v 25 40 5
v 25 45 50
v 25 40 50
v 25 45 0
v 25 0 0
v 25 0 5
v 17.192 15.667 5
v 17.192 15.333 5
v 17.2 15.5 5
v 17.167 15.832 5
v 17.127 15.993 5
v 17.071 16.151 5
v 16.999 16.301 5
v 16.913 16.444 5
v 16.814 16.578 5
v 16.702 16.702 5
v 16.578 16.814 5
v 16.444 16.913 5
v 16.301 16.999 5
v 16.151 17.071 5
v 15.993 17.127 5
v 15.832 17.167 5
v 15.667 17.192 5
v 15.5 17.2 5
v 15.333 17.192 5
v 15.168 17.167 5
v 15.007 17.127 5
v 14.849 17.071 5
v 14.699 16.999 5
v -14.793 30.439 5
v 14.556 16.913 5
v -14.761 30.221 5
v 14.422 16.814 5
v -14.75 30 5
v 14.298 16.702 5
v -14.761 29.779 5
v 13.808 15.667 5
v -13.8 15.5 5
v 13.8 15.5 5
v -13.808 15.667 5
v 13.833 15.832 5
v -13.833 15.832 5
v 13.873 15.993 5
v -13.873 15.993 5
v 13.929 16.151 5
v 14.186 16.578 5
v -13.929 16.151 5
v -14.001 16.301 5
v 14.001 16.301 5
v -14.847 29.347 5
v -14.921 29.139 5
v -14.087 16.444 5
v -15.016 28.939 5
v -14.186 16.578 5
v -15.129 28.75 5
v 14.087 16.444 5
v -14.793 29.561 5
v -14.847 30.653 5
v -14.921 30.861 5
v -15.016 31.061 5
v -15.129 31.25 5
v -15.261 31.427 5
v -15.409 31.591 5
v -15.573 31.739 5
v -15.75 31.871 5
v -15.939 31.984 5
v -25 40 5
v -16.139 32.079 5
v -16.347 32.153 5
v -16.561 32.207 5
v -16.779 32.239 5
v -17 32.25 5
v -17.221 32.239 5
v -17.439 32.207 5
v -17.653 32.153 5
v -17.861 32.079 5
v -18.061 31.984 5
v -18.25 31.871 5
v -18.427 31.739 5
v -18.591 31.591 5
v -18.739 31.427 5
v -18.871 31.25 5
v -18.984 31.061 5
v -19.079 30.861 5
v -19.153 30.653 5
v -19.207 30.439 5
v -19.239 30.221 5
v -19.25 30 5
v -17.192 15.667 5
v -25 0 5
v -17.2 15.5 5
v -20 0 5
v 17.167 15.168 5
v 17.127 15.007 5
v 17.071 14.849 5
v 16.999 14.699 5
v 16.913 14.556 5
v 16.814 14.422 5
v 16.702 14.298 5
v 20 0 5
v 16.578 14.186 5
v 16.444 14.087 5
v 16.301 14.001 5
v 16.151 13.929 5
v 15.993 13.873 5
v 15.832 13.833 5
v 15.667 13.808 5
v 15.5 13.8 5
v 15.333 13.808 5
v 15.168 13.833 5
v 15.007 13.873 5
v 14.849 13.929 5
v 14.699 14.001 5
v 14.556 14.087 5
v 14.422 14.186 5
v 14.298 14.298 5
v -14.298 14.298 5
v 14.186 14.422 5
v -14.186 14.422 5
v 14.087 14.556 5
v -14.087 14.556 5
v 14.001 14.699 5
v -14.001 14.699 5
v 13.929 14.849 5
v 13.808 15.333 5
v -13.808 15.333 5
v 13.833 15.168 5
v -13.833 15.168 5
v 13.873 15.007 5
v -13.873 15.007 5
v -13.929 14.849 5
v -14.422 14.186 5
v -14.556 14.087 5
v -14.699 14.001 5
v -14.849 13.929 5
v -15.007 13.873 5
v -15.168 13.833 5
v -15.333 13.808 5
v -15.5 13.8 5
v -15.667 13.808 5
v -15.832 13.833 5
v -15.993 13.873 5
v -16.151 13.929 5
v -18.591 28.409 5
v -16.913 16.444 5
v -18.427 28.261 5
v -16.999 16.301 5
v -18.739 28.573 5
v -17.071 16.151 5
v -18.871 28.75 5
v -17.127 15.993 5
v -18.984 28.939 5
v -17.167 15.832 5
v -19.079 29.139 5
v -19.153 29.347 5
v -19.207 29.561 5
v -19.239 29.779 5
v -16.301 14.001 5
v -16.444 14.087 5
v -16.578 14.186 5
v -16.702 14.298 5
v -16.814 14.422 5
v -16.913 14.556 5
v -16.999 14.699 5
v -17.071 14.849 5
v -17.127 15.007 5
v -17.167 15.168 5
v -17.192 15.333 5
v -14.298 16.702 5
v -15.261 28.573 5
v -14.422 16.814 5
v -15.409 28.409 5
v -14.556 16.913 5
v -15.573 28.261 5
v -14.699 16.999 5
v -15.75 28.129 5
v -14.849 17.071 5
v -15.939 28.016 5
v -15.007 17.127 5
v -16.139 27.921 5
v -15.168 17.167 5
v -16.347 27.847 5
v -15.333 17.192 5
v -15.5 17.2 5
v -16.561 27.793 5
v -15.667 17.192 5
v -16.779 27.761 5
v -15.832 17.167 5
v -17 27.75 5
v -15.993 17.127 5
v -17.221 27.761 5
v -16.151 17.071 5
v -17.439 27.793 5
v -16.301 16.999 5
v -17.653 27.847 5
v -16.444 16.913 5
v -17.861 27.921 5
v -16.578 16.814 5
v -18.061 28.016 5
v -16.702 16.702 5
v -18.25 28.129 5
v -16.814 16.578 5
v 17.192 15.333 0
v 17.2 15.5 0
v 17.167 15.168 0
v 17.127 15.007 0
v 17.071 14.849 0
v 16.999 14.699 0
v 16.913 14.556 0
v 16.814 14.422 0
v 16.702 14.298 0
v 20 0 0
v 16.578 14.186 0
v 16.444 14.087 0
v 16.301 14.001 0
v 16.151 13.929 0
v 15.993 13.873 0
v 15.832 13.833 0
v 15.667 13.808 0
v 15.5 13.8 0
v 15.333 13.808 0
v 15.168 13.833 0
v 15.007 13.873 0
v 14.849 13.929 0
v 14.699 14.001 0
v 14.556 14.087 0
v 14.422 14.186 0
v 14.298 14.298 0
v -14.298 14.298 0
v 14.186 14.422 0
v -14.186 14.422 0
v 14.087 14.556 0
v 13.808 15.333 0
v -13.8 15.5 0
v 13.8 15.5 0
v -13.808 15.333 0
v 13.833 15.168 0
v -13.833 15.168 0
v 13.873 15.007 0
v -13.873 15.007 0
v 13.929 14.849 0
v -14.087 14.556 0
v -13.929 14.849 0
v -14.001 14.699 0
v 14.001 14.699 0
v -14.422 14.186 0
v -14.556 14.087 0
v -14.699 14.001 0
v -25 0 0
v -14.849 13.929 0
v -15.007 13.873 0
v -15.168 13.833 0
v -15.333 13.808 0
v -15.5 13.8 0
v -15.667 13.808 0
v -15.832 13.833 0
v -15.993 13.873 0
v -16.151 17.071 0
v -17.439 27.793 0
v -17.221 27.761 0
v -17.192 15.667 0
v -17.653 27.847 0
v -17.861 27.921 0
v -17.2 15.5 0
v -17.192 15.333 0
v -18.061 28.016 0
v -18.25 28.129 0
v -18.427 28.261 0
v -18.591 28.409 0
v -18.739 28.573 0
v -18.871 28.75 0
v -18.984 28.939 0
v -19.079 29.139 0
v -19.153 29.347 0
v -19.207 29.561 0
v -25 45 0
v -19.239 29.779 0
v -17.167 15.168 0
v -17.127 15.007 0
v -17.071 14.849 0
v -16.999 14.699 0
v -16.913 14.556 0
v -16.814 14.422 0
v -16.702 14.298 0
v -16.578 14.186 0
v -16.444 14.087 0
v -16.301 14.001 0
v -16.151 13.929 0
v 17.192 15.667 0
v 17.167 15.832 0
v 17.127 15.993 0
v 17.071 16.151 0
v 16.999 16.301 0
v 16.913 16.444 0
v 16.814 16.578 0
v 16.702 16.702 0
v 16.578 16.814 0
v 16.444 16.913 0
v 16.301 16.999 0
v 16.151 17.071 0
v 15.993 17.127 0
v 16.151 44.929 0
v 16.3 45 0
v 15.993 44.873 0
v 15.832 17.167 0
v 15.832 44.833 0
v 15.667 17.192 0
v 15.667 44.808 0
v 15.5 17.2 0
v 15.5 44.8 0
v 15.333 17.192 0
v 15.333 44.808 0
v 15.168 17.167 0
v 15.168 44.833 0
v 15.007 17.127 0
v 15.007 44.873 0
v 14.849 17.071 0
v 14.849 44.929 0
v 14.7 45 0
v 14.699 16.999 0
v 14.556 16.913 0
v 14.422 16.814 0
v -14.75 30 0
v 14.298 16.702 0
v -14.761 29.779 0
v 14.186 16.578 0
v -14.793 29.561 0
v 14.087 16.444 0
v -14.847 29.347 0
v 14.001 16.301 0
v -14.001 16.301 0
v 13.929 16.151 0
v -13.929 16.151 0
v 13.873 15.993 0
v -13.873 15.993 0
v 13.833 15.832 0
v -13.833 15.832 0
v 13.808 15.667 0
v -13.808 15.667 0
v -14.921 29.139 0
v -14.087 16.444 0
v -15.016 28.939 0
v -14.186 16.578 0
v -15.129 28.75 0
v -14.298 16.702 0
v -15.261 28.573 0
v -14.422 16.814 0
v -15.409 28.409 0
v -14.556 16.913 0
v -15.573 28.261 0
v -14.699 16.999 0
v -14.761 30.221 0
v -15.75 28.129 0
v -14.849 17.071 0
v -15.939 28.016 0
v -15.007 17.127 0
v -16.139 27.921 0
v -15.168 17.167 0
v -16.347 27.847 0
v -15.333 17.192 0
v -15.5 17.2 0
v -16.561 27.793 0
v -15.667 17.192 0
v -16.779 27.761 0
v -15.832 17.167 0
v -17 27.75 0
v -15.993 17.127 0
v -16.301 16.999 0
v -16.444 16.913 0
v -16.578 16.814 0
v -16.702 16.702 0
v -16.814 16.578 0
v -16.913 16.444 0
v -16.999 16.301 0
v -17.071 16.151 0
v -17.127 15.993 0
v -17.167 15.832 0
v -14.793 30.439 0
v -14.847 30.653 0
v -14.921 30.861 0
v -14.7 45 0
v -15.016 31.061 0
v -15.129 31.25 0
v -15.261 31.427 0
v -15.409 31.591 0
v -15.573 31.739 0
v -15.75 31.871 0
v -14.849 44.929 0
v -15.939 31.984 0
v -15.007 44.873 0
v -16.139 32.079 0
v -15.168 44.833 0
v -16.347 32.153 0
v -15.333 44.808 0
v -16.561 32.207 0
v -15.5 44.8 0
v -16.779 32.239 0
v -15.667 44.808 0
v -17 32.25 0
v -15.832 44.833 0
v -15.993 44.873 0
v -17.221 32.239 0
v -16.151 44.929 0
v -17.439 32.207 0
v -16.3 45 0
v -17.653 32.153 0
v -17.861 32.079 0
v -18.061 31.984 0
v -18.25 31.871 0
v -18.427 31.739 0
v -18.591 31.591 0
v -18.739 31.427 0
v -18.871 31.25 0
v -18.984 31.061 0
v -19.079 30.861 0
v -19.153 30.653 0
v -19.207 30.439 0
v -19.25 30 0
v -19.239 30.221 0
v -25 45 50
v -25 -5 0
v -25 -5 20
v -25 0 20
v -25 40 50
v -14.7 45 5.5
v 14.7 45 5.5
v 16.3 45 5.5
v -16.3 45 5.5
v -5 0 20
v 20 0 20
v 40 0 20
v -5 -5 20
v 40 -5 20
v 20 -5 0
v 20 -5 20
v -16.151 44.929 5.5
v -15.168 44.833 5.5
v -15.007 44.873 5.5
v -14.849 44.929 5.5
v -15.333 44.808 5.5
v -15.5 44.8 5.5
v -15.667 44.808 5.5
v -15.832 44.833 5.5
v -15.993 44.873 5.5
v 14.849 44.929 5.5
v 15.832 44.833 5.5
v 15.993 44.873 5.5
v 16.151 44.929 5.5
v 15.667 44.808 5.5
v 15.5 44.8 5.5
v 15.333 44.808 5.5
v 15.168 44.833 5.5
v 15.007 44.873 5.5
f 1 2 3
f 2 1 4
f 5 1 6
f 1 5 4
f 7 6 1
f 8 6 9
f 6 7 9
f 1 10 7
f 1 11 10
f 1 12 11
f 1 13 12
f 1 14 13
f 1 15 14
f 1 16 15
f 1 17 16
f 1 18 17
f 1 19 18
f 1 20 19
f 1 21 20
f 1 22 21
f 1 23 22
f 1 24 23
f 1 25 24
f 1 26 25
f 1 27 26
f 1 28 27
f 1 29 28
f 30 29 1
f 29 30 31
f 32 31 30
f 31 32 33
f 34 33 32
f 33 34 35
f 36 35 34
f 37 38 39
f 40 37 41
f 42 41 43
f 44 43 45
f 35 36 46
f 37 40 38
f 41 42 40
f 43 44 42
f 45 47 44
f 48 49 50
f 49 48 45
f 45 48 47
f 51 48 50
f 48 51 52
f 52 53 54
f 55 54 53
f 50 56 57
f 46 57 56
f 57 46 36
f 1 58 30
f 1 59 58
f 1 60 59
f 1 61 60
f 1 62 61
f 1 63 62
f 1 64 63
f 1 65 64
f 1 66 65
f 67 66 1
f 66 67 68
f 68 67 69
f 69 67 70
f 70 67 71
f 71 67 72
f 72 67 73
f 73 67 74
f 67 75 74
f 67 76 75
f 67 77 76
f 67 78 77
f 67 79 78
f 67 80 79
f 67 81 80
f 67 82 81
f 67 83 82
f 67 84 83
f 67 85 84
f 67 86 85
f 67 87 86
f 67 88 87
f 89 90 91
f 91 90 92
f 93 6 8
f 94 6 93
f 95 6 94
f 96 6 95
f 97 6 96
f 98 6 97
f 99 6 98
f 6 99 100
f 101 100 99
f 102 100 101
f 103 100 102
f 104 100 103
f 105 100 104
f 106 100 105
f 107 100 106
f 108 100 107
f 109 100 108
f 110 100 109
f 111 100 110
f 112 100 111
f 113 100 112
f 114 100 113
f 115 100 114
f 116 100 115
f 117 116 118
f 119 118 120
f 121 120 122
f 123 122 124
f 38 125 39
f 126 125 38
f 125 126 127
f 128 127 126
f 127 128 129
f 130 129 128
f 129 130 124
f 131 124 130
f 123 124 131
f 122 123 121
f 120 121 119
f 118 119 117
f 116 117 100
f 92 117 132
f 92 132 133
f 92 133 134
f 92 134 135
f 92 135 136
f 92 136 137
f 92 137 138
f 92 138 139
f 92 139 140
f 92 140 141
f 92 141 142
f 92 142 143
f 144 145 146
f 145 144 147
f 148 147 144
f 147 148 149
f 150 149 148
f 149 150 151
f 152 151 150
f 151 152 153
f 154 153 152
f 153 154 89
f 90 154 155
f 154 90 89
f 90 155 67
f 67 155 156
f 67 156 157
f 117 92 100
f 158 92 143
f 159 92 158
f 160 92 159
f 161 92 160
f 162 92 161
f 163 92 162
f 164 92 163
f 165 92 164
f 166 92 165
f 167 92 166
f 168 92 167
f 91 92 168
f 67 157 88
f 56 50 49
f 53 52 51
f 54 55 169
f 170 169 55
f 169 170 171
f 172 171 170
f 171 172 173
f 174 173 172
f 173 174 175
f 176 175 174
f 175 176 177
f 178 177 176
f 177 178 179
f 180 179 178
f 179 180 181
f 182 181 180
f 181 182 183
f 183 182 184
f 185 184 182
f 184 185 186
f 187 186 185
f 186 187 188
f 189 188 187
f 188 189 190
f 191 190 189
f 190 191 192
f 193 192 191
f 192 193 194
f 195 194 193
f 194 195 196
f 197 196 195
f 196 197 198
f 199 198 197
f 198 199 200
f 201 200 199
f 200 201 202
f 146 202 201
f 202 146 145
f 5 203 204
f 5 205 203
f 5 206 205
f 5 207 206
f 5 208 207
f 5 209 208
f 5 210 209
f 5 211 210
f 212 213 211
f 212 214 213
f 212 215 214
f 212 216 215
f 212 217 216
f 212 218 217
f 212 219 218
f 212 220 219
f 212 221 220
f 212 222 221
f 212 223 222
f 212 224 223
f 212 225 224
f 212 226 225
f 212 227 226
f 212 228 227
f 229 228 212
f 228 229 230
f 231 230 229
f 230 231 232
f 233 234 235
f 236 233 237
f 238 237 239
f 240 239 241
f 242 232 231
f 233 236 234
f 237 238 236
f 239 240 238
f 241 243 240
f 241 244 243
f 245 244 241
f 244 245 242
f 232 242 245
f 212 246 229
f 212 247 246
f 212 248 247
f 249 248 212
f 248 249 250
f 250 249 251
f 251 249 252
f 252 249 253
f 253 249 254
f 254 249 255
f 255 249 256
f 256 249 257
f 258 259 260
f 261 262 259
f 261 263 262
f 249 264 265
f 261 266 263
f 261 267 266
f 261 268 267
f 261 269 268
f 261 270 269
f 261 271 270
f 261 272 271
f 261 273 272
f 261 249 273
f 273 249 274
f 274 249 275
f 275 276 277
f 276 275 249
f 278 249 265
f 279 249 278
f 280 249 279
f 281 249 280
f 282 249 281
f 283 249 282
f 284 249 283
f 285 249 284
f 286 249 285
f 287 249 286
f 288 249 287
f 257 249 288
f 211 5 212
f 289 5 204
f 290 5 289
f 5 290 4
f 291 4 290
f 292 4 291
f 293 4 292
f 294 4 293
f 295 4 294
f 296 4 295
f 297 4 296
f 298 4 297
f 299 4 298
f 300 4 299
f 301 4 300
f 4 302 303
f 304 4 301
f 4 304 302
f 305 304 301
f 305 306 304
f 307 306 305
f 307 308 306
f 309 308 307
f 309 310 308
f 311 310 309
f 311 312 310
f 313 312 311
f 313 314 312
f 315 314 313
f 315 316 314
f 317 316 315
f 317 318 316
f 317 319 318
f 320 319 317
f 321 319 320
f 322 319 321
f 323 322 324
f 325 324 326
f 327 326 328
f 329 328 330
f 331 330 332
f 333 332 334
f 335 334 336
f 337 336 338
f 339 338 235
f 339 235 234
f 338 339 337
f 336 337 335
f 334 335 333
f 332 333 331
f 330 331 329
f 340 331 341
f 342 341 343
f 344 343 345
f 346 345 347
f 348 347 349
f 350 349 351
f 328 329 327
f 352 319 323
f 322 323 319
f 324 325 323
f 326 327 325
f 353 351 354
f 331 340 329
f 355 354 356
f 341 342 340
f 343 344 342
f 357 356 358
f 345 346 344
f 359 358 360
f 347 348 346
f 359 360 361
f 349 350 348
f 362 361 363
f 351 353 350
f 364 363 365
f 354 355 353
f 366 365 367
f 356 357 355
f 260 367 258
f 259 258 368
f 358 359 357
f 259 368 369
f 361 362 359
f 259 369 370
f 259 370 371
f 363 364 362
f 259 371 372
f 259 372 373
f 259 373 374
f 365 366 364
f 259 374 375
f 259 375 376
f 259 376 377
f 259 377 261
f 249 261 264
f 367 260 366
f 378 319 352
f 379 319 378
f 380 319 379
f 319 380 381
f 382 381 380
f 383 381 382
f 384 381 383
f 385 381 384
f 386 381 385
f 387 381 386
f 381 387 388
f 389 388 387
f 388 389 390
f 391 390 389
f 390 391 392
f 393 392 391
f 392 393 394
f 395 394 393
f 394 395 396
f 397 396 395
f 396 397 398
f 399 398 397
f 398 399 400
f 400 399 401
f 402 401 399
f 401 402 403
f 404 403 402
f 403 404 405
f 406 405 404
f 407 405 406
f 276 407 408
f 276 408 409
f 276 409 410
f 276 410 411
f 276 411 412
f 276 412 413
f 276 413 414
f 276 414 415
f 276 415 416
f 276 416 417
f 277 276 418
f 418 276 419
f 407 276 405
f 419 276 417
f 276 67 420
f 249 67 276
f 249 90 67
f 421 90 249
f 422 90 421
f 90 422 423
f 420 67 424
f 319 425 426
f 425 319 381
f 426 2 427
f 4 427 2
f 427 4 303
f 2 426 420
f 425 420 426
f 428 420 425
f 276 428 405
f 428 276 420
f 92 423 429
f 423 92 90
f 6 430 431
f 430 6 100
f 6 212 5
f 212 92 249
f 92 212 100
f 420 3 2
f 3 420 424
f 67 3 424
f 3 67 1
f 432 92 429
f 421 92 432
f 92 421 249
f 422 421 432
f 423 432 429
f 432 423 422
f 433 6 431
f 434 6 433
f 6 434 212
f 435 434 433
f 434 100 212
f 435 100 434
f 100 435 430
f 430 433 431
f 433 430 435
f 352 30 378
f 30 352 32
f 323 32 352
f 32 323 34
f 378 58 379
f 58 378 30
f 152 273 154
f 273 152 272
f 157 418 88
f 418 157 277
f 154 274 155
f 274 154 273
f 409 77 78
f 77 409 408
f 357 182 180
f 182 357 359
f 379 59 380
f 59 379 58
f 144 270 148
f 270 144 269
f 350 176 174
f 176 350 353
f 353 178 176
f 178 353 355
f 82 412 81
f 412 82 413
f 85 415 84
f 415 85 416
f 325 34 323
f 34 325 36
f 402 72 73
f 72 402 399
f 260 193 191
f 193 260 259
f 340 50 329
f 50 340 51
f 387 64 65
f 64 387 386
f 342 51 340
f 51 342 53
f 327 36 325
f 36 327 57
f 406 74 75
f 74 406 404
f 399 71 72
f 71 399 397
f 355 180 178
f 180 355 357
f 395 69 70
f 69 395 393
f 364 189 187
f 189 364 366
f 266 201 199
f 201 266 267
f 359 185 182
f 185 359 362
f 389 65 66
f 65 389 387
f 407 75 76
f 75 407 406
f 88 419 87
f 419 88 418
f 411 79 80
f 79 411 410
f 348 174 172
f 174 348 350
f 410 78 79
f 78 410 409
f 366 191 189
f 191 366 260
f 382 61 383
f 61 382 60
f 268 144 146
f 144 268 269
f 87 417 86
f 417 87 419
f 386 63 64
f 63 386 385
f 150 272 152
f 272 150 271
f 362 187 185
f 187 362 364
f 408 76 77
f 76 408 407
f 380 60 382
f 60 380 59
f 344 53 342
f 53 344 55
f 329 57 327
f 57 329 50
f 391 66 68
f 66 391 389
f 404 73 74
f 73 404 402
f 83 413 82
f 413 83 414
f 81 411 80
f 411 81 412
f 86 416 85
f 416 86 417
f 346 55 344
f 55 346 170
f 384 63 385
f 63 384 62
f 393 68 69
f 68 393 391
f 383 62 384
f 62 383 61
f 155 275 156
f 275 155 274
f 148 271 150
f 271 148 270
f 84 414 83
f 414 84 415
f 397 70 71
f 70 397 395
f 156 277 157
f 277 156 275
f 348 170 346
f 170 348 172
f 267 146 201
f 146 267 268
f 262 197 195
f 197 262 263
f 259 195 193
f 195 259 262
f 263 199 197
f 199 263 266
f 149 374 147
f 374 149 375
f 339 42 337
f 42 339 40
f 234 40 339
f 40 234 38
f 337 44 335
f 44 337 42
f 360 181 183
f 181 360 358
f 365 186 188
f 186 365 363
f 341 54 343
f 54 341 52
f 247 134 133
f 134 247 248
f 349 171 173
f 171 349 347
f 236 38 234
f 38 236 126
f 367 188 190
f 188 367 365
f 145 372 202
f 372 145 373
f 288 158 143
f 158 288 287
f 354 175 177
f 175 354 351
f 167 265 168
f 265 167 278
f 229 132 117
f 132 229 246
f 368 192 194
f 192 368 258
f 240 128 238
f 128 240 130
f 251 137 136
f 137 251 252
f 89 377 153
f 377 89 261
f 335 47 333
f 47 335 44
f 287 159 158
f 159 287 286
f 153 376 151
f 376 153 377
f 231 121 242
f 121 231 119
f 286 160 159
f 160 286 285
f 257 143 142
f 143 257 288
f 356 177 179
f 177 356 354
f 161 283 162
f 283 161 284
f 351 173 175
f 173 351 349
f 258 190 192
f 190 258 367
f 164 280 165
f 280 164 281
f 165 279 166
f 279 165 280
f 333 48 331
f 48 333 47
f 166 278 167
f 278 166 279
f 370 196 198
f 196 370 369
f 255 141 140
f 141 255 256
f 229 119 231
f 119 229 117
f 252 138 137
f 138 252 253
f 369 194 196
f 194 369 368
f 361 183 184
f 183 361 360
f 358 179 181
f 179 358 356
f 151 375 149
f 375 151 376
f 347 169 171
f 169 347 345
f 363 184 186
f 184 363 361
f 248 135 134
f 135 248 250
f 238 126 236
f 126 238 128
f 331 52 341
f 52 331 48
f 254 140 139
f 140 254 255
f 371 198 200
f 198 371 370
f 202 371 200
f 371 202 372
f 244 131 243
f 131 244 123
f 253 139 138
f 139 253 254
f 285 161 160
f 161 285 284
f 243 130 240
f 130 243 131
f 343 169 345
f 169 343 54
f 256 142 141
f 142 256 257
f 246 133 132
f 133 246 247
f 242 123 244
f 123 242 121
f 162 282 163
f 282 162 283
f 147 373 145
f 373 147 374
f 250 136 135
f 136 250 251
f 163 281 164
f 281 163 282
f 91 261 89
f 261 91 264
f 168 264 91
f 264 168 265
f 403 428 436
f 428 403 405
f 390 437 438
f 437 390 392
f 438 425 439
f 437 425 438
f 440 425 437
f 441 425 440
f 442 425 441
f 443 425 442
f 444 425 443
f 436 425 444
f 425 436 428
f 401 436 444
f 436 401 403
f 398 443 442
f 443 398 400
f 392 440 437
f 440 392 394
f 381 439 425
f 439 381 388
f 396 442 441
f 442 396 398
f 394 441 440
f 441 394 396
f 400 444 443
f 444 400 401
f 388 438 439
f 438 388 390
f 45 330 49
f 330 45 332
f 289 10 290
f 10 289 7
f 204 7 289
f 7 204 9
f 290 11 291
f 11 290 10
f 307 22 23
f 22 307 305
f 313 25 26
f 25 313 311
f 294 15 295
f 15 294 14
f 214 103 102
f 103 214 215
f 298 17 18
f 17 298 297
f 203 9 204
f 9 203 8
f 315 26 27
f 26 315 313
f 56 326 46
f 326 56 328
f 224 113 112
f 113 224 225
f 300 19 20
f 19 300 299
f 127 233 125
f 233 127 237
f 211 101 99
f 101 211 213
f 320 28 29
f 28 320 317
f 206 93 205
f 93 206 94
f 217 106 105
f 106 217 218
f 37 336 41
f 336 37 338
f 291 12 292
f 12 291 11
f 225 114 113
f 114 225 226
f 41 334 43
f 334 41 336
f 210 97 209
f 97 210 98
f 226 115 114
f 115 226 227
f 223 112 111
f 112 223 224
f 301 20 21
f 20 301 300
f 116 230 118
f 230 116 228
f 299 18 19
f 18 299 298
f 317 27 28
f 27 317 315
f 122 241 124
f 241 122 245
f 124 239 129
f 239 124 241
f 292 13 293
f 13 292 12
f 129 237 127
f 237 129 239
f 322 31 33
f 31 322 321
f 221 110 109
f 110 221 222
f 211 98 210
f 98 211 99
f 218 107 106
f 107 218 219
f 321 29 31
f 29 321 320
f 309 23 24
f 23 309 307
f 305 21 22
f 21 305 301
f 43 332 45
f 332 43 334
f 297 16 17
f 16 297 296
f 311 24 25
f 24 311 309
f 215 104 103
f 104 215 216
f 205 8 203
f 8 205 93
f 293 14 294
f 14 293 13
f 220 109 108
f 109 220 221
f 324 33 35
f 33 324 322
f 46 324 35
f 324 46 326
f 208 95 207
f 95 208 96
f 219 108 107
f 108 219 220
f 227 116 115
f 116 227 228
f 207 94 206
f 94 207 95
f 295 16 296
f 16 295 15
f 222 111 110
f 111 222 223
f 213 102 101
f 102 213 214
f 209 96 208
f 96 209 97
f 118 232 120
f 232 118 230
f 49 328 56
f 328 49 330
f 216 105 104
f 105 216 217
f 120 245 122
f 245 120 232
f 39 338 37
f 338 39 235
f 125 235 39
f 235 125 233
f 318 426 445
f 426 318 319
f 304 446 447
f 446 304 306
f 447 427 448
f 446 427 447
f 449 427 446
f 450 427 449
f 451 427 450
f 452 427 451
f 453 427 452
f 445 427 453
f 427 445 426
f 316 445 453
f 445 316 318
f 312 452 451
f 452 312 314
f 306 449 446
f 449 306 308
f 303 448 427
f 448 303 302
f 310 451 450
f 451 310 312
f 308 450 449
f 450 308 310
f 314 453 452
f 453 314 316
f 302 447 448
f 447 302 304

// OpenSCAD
// L-shaped mounting bracket for a NEMA 17 stepper motor (e.g. syringe pump)
// Print orientation: base plate on the bed, motor plate building upward.

$fn = 64;

// ---------------- Dimensions (mm) ----------------
base_x      = 25;    // base plate half-width (X)
base_y      = 45;    // base plate length (Y)
base_z      = 5;     // base plate thickness (Z)

motor_h     = 50;    // motor plate height (Z)
motor_y     = 5;     // motor plate thickness (Y)

boss_d      = 23;    // motor centring boss hole diameter
boss_x      = 0;     // boss hole centre X
boss_z      = 28;    // boss hole centre Z

screw_d     = 3.4;   // M3 screw hole diameter
screw_p     = 31;    // square pattern side length
screw_n     = 4;     // number of screw holes

gusset_t    = 5;     // gusset thickness (X)
gusset_y    = 20;    // gusset leg along +Y
gusset_z    = 20;    // gusset leg along +Z

eps         = 0.5;   // cutter overshoot past faces

// ---------------- Model ----------------
difference() {
    union() {
        // Base plate
        translate([-base_x, 0, 0])
            cube([base_x * 2, base_y, base_z]);

        // Motor plate (standing on the back edge of the base)
        translate([-base_x, base_y - motor_y, 0])
            cube([base_x * 2, motor_y, motor_h]);

        // Left gusset: right triangle in YZ, flush with x = -25
        translate([-base_x, 0, 0])
            rotate([90, 0, 0])
                linear_extrude(height = gusset_t)
                    polygon(points = [
                        [gusset_y, gusset_z],
                        [0,        gusset_z],
                        [0,        0]
                    ]);

        // Right gusset: right triangle in YZ, flush with x = +25
        translate([base_x - gusset_t, 0, 0])
            rotate([90, 0, 0])
                linear_extrude(height = gusset_t)
                    polygon(points = [
                        [gusset_y, gusset_z],
                        [0,        gusset_z],
                        [0,        0]
                    ]);
    }

    // Base plate through-holes (M4)
    for (h = [base_z + eps, -eps])
        translate([-17, 30, h])
            cylinder(d = 4.5, h = abs(h) + base_z + 2 * eps);

    // Motor boss hole (along Y) and screw holes (square pattern)
    translate([boss_x, 0, boss_z])
        rotate([0, 90, 0]) {
            difference() {
                cylinder(d = boss_d, h = motor_y + 2 * eps);
                translate([0, -eps, 0])
                    cylinder(d = boss_d + 2 * eps, h = motor_y + 2 * eps);
            }
        }

    for (i = [0 : screw_n - 1])
        for (j = [0 : screw_n - 1])
            translate([(i - (screw_n - 1) / 2) * screw_p,
                       (j - (screw_n - 1) / 2) * screw_p,
                       -eps])
                cylinder(d = screw_d, h = motor_y + 2 * eps);
}
